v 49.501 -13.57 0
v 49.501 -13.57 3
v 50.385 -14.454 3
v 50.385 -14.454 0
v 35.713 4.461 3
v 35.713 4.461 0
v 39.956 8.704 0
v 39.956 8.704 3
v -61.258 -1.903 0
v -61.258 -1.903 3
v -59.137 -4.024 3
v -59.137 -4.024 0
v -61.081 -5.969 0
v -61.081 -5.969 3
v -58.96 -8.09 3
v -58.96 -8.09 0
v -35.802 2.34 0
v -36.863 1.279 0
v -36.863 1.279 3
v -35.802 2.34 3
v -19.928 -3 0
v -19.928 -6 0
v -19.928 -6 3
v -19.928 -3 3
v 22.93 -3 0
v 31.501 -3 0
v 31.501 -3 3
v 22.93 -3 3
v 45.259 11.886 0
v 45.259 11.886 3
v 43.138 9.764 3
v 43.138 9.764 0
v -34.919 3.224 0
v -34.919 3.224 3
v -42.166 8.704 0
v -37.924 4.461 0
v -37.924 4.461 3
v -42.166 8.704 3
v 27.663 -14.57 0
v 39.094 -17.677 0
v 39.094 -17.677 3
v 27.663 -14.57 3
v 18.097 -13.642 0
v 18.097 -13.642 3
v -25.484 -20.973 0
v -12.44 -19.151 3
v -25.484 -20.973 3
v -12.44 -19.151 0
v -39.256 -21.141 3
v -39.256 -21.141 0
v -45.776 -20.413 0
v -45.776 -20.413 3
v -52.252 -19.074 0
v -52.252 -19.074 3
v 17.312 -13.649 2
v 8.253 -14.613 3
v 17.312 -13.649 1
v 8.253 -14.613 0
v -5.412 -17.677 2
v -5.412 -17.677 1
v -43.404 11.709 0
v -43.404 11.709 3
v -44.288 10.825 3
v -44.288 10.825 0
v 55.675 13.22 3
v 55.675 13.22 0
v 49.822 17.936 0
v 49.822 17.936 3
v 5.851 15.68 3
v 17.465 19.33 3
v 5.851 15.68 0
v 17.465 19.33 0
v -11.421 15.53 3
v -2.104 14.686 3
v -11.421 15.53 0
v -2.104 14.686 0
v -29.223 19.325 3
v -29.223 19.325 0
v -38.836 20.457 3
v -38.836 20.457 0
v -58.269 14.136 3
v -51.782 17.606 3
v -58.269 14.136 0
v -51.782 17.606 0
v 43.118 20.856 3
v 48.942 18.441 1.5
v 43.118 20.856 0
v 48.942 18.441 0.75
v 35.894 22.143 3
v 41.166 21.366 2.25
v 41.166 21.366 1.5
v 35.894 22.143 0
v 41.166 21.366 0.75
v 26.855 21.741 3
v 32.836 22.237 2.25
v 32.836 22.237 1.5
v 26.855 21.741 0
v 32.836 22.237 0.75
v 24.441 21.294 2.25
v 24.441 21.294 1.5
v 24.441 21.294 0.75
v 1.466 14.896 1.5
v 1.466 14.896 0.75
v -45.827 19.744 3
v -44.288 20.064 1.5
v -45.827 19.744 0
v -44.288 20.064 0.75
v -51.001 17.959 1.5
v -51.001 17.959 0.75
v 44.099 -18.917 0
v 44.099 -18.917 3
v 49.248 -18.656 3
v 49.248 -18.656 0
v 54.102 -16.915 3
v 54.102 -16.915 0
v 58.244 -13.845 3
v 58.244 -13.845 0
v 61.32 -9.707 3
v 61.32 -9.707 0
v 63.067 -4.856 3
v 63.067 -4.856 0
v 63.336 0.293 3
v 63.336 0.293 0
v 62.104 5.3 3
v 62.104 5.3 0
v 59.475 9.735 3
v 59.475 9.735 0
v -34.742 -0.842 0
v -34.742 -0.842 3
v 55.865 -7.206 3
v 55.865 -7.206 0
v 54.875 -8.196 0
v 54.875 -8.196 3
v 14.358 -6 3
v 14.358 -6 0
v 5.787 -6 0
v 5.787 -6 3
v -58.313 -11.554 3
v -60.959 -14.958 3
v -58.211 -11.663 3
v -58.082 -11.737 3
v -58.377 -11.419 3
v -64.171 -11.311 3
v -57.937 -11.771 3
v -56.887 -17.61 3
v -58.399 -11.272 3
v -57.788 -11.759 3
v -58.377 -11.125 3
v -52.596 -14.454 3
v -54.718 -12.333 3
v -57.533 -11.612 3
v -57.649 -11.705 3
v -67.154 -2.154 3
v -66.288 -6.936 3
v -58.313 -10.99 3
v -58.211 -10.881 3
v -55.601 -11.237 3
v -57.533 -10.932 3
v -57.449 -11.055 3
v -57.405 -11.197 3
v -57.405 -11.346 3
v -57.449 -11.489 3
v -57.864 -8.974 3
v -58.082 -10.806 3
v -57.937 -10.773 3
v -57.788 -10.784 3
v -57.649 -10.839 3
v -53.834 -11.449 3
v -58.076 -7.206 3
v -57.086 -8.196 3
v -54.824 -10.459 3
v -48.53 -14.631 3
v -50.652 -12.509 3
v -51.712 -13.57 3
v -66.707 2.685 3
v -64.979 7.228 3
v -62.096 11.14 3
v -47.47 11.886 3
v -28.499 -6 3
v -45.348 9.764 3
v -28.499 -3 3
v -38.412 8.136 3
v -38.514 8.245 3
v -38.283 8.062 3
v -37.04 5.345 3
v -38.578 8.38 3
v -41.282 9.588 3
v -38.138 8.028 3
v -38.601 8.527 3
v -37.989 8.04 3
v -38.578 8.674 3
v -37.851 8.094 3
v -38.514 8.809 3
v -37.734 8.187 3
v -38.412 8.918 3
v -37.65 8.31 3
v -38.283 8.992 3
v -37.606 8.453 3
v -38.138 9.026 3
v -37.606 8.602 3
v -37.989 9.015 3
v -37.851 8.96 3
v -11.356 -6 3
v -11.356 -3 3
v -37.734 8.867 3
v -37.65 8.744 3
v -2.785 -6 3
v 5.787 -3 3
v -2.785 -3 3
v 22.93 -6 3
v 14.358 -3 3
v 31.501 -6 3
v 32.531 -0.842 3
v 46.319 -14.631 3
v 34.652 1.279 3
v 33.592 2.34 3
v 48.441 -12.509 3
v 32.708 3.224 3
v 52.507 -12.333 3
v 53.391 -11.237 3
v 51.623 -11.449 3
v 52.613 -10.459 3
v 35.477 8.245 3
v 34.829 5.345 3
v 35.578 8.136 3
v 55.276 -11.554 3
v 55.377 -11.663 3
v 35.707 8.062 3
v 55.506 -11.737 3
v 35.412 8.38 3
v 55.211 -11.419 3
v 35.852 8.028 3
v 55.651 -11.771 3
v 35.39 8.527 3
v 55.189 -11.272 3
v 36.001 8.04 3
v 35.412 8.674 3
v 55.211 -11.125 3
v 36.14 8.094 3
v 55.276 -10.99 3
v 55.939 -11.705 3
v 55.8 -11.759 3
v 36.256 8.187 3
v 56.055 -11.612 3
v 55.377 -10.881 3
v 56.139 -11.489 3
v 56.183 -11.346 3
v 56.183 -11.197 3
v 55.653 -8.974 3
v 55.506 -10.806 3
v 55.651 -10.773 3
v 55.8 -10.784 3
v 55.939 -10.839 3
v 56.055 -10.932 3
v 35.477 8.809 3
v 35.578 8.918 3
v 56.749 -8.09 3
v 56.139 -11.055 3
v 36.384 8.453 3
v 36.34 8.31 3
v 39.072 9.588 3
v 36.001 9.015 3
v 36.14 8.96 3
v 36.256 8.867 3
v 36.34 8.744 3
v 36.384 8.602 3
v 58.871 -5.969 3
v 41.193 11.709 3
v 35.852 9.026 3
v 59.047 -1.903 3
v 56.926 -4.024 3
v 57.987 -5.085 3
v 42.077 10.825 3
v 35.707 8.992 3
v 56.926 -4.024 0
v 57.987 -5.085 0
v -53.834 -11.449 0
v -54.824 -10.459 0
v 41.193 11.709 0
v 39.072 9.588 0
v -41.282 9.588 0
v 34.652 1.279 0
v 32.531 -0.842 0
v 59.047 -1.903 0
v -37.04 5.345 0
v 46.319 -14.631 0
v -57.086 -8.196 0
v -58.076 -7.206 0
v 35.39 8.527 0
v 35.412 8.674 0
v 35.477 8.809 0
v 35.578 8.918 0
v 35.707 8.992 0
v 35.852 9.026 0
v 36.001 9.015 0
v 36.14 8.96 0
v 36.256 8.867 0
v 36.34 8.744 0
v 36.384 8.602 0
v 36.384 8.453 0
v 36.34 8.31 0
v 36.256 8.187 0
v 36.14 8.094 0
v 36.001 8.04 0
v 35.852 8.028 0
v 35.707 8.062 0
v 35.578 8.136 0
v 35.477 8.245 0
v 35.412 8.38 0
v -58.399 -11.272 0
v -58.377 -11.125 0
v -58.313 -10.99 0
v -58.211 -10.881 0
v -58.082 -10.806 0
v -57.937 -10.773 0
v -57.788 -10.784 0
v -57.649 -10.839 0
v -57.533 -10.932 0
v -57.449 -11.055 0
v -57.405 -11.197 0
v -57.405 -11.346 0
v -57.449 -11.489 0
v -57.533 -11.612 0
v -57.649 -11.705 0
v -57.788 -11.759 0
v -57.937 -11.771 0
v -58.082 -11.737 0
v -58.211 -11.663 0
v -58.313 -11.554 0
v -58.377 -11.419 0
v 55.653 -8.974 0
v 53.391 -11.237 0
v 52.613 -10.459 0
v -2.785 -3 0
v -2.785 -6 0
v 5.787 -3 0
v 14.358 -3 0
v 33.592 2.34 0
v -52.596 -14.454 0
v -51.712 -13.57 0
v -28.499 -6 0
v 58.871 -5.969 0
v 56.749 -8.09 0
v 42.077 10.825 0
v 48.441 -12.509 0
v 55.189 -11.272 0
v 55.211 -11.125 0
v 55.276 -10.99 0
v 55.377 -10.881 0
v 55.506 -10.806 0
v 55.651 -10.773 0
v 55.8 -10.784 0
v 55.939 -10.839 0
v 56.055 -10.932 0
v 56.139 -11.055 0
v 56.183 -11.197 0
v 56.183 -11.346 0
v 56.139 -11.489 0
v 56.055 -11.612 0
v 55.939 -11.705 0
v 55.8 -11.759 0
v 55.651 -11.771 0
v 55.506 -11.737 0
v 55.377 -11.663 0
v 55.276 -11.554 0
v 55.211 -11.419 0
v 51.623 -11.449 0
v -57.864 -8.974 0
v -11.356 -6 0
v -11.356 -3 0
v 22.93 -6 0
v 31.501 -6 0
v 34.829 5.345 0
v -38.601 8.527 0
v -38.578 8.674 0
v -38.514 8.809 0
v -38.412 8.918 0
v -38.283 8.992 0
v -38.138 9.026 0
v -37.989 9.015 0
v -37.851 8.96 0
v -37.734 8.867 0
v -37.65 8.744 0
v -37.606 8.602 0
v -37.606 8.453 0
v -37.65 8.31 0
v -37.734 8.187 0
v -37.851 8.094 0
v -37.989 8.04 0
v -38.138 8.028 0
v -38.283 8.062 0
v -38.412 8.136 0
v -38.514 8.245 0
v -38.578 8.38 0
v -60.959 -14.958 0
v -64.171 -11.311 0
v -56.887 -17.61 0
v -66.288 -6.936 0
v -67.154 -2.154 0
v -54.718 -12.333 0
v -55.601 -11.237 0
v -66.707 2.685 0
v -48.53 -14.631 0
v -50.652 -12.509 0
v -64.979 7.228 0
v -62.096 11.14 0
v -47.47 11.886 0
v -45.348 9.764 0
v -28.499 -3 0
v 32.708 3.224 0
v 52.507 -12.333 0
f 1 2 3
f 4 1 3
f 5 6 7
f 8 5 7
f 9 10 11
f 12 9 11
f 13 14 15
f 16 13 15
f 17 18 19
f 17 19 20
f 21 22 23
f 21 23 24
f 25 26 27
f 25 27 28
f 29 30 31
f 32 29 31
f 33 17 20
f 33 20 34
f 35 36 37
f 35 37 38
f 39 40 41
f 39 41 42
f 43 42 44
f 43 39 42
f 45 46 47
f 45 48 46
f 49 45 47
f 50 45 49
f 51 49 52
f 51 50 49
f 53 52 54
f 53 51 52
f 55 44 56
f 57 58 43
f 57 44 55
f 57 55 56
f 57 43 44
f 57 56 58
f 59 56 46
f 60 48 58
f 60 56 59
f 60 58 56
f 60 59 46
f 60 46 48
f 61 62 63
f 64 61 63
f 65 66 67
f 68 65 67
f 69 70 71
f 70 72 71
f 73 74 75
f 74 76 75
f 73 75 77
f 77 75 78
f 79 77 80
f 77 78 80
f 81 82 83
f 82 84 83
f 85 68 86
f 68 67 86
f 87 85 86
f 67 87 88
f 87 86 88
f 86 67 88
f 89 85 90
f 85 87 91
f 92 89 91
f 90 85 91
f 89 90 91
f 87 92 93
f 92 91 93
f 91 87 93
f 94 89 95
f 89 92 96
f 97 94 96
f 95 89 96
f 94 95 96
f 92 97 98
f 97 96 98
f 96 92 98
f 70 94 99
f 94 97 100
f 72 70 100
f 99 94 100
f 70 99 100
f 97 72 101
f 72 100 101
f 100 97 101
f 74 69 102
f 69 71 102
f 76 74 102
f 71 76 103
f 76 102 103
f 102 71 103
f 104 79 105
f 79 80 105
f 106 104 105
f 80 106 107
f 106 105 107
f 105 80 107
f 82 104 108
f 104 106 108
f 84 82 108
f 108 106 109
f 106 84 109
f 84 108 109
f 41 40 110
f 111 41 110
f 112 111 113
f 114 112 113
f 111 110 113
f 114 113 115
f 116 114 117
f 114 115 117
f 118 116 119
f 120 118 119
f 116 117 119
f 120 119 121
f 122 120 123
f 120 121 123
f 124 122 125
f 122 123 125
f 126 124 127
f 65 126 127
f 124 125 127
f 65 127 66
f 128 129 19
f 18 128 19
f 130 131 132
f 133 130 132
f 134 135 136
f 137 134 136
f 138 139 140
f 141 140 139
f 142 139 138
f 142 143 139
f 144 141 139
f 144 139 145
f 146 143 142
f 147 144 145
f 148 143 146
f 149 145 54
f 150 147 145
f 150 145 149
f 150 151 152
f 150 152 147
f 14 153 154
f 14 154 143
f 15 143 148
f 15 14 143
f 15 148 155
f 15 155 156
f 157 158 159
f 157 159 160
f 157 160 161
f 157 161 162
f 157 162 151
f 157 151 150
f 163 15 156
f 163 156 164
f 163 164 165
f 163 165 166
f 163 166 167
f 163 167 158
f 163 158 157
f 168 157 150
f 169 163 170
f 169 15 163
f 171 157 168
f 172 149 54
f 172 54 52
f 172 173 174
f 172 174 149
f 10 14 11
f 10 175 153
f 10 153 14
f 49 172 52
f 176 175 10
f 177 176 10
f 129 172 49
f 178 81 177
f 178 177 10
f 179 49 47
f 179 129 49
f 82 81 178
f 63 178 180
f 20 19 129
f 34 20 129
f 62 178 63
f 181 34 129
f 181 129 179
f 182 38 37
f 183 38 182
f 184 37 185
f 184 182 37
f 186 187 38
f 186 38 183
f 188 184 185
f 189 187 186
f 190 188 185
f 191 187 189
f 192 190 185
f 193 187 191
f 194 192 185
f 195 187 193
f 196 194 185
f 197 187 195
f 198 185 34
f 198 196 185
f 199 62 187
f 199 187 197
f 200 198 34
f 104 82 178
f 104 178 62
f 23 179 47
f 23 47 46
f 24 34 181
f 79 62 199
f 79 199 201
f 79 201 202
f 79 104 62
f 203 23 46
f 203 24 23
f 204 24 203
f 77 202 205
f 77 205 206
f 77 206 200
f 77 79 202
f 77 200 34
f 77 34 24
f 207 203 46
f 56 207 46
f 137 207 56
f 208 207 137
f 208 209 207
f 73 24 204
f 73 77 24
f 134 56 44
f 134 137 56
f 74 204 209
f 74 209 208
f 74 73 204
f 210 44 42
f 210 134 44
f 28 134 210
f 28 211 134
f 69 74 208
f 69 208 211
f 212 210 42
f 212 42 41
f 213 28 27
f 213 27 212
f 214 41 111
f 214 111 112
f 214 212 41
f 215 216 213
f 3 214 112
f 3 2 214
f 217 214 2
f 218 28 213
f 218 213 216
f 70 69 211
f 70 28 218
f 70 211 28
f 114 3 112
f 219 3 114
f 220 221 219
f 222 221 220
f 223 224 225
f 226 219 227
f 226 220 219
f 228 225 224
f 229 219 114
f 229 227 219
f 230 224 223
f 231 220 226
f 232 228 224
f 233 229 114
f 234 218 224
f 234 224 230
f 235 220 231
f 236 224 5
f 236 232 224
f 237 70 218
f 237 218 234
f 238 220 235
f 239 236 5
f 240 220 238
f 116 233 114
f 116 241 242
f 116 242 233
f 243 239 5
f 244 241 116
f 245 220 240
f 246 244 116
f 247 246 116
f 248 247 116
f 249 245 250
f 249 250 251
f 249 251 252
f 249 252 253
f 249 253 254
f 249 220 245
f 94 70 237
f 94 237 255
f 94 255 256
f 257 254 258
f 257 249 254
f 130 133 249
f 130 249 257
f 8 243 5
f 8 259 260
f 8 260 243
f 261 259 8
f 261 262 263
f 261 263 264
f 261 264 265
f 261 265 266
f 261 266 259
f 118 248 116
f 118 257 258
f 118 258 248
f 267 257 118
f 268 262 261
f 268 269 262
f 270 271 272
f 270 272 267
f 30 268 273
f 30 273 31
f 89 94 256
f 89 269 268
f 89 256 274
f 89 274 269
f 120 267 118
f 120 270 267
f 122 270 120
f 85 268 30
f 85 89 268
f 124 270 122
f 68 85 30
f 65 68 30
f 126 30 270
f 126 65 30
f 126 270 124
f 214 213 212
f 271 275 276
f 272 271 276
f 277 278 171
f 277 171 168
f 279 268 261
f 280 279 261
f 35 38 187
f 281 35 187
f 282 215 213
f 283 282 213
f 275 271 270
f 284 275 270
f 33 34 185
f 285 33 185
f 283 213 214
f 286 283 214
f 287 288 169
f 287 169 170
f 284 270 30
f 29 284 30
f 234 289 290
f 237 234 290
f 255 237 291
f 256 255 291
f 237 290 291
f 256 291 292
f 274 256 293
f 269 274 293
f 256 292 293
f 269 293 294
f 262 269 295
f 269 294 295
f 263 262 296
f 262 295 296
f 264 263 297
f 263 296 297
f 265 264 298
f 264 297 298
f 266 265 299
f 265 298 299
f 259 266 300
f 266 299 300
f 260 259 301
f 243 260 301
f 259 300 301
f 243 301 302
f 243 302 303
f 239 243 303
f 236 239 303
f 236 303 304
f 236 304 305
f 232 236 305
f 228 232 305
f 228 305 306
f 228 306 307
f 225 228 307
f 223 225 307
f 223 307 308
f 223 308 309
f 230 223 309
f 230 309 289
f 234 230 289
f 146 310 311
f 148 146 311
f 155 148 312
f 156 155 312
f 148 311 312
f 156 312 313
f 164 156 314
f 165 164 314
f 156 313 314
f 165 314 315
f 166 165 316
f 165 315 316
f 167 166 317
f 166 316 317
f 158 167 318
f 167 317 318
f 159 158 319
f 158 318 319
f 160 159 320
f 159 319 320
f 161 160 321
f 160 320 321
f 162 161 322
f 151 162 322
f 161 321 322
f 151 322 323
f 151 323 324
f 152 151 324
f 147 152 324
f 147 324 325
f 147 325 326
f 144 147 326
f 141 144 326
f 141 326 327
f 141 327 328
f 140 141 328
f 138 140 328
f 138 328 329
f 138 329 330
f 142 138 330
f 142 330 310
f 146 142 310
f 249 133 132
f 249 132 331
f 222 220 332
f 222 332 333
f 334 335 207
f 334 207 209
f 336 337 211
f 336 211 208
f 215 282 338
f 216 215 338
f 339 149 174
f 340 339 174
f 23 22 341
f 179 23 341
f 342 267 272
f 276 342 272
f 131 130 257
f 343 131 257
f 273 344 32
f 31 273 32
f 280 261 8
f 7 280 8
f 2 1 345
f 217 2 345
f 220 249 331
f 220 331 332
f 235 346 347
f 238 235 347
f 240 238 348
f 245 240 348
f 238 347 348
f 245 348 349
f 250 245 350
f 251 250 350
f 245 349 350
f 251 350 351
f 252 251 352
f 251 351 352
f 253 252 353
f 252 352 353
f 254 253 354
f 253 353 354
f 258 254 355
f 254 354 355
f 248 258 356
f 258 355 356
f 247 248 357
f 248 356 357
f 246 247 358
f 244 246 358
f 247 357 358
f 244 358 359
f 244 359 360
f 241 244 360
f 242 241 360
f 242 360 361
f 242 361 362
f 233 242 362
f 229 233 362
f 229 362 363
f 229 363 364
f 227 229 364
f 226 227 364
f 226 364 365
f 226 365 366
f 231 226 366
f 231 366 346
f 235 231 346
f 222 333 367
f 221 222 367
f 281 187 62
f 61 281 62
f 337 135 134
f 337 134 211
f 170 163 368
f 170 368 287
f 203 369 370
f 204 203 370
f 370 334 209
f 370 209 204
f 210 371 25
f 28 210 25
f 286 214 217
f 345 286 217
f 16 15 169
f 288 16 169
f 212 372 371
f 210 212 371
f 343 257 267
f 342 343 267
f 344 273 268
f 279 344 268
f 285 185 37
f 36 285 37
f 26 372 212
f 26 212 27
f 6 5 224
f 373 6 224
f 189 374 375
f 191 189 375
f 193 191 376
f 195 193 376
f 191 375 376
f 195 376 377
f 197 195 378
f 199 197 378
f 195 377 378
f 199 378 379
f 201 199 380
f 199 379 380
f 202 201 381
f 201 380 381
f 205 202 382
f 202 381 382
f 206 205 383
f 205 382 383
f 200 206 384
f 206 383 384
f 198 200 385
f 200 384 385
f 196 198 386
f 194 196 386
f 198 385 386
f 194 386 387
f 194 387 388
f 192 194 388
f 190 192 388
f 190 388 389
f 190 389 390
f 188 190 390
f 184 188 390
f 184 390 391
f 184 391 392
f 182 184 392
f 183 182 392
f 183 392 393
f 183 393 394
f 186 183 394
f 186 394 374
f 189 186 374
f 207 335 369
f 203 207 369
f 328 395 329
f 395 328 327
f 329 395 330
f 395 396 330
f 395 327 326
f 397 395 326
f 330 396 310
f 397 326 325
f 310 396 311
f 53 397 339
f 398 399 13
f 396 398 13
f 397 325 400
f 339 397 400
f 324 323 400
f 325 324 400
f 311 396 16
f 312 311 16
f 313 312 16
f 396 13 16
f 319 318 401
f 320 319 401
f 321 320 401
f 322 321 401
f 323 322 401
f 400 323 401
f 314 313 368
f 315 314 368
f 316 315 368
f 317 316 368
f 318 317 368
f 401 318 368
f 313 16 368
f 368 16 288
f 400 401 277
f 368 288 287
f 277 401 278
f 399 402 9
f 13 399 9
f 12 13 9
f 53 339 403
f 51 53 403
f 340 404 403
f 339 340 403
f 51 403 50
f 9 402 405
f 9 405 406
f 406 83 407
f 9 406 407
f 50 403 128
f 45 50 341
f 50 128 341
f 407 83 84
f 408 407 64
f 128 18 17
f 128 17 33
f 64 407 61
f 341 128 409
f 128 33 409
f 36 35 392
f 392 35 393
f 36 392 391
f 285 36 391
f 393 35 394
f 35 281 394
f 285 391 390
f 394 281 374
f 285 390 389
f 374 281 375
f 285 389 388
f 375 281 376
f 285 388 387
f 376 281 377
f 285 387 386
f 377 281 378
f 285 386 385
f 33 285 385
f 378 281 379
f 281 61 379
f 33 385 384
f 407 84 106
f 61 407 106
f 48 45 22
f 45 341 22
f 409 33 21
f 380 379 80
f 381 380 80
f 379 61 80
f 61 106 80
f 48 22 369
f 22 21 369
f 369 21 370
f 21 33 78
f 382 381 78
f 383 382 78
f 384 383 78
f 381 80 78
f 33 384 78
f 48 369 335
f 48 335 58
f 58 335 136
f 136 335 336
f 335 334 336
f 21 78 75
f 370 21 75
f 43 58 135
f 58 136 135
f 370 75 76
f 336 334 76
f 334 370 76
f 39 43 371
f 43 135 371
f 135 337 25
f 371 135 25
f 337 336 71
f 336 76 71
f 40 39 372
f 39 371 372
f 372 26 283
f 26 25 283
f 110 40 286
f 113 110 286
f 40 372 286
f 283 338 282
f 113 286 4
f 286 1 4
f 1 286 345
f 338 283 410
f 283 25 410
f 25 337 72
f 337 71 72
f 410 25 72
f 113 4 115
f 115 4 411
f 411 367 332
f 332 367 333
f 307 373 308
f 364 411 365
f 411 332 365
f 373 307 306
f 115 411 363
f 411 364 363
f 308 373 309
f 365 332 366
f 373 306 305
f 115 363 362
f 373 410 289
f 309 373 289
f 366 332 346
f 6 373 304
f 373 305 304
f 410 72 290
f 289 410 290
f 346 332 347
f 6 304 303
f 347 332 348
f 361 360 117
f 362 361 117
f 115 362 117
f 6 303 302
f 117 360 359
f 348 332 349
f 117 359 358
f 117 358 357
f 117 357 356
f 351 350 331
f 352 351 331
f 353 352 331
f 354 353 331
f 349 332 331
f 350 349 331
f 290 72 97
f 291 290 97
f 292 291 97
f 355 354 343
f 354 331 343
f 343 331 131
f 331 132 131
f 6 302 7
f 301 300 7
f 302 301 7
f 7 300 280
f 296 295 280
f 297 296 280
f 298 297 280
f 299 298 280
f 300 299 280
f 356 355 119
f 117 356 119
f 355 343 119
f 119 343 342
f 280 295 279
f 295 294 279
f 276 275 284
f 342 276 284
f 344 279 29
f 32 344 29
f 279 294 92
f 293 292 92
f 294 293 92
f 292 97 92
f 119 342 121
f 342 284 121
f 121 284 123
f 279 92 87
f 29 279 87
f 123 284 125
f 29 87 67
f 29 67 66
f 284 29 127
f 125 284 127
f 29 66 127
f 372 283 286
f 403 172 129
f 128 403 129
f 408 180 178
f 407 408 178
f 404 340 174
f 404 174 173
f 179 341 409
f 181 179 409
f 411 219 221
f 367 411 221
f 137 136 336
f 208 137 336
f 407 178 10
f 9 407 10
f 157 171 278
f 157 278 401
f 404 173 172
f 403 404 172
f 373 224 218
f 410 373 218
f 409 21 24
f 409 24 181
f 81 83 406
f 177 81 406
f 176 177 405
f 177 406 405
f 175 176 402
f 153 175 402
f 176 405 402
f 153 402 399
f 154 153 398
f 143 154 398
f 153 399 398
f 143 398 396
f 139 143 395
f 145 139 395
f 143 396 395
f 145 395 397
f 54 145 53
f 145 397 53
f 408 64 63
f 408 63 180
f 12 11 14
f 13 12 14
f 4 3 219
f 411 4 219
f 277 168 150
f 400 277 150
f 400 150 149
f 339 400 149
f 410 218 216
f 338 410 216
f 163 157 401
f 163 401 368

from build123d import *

# Parameters (mm, degrees)
AUFSATZ_LINEAR_AUSTRAGEN1_DEPTH = 3
SCHNITT_LINEAR_AUSTRAGEN2_DEPTH = 71.820715528
F_1_0_1_DURCHMESSER_BOHRUNG1_D  = 1
SKIZZE6_W                       = 8.571428571
SKIZZE6_H                       = 3
SKIZZE6_W_2                     = 8.571428572
SCHNITT_LINEAR_AUSTRAGEN3_DEPTH = 10
SCHNITT_LINEAR_AUSTRAGEN4_DEPTH = 10


with BuildPart() as part:
    # Skizze1 → Aufsatz-Linear austragen1 (new body)
    with BuildSketch(Plane.XY):
        with BuildLine():
            ThreePointArc((39.09381812, -17.677272974), (61.320070719, -9.707081363), (55.674936462, 13.220254247))
            add(Edge.make_bspline(
                [(55.674936462, 13.220254247), (47.609471596, 21.818170185), (26.779512273, 24.965996748), (-4.819250153, 8.3879963), (-36.143165112, 25.515706185), (-52.998162401, 17.21531918), (-58.269375127, 14.13647811)],
                knots=[0, 0, 0, 0, 0.281767128, 0.483095288, 0.871800147, 1, 1, 1, 1], degree=3))
            ThreePointArc((-58.269375127, 14.13647811), (-66.8837152, -4.574474742), (-52.252246026, -19.073672007))
            add(Edge.make_bspline(
                [(39.09381812, -17.677272974), (32.211724331, -15.261258593), (16.874059684, -11.708986477), (-13.13089401, -20.340470931), (-36.840562428, -23.058241539), (-52.252246026, -19.073672007)],
                knots=[0, 0, 0, 0, 0.240412868, 0.489927657, 1, 1, 1, 1], degree=3))
        make_face()
        Polygon((49.501476789, -13.570033348), (33.591574213, 2.339869229), (42.076855587, 10.825150603), (57.986758164, -5.084751973), align=None, mode=Mode.SUBTRACT)
        Polygon((-51.712310601, -13.570033348), (-35.802408025, 2.339869229), (-44.287689399, 10.825150603), (-60.197591975, -5.084751973), align=None, mode=Mode.SUBTRACT)
    extrude(amount=AUFSATZ_LINEAR_AUSTRAGEN1_DEPTH)

    # Skizze3 → Schnitt-Linear austragen2 (cut, through all)
    with BuildSketch(Plane.XY.offset(3)):
        Polygon((-47.469669914, 11.885810775), (-61.258252147, -1.902771458), (-59.136931804, -4.024091802), (-61.081475452, -5.96863545), (-58.960155108, -8.089955793), (-58.076271632, -7.206072317), (-53.833630945, -11.448713004), (-54.717514421, -12.332596481), (-52.596194078, -14.453916824), (-50.651650429, -12.509373176), (-48.530330086, -14.630693519), (-34.741747853, -0.842111286), (-36.863068196, 1.279209057), (-34.918524548, 3.223752706), (-37.039844892, 5.345073049), (-37.923728368, 4.461189573), (-42.166369055, 8.70383026), (-41.282485579, 9.587713736), (-43.403805922, 11.70903408), (-45.348349571, 9.764490432), align=None)
        Polygon((59.047418335, -1.902771458), (45.258836102, 11.885810775), (43.137515759, 9.764490432), (41.19297211, 11.70903408), (39.071651767, 9.587713736), (39.955535243, 8.70383026), (35.712894556, 4.461189573), (34.82901108, 5.345073049), (32.707690736, 3.223752706), (34.652234384, 1.279209057), (32.530914041, -0.842111286), (46.319496274, -14.630693519), (48.440816618, -12.509373176), (50.385360266, -14.453916824), (52.506680609, -12.332596481), (51.622797133, -11.448713004), (55.86543782, -7.206072317), (56.749321296, -8.089955793), (58.87064164, -5.96863545), (56.926097992, -4.024091802), align=None)
    extrude(amount=-SCHNITT_LINEAR_AUSTRAGEN2_DEPTH, mode=Mode.SUBTRACT)

    # Ø1.0 (1) Durchmesser Bohrung1 (through all)
    with Locations(Plane.XY.offset(3)):
        with Locations((-38.100505063, 8.527053564), (-57.899494937, -11.271936309), (35.889671251, 8.527053564), (55.688661125, -11.271936309)):
            Hole(F_1_0_1_DURCHMESSER_BOHRUNG1_D / 2)

    # Skizze6 → Schnitt-Linear austragen3 (cut)
    with BuildSketch(Plane(origin=(0, 0, 0), x_dir=(-1, 0, 0), z_dir=(0, 0, -1))):
        with Locations((-27.215326594, -4.5)):
            Rectangle(SKIZZE6_W, SKIZZE6_H)
        with Locations((-10.072469451, -4.5)):
            Rectangle(SKIZZE6_W, SKIZZE6_H)
        with Locations((7.070387692, -4.5)):
            Rectangle(SKIZZE6_W, SKIZZE6_H)
        with Locations((24.213244835, -4.5)):
            Rectangle(SKIZZE6_W_2, SKIZZE6_H)
    extrude(amount=-SCHNITT_LINEAR_AUSTRAGEN3_DEPTH, mode=Mode.SUBTRACT)

    # Skizze7 → Schnitt-Linear austragen4 (cut)
    with BuildSketch(Plane.XY.offset(3)):
        Polygon((-57.086322138, -8.196021811), (-54.823580438, -10.45876351), (-55.601397898, -11.23658097), (-57.864139598, -8.97383927), align=None)
        Polygon((52.612746627, -10.45876351), (54.875488326, -8.196021811), (55.653305786, -8.97383927), (53.390564086, -11.23658097), align=None)
    extrude(amount=-SCHNITT_LINEAR_AUSTRAGEN4_DEPTH, mode=Mode.SUBTRACT)


solid = part.part
